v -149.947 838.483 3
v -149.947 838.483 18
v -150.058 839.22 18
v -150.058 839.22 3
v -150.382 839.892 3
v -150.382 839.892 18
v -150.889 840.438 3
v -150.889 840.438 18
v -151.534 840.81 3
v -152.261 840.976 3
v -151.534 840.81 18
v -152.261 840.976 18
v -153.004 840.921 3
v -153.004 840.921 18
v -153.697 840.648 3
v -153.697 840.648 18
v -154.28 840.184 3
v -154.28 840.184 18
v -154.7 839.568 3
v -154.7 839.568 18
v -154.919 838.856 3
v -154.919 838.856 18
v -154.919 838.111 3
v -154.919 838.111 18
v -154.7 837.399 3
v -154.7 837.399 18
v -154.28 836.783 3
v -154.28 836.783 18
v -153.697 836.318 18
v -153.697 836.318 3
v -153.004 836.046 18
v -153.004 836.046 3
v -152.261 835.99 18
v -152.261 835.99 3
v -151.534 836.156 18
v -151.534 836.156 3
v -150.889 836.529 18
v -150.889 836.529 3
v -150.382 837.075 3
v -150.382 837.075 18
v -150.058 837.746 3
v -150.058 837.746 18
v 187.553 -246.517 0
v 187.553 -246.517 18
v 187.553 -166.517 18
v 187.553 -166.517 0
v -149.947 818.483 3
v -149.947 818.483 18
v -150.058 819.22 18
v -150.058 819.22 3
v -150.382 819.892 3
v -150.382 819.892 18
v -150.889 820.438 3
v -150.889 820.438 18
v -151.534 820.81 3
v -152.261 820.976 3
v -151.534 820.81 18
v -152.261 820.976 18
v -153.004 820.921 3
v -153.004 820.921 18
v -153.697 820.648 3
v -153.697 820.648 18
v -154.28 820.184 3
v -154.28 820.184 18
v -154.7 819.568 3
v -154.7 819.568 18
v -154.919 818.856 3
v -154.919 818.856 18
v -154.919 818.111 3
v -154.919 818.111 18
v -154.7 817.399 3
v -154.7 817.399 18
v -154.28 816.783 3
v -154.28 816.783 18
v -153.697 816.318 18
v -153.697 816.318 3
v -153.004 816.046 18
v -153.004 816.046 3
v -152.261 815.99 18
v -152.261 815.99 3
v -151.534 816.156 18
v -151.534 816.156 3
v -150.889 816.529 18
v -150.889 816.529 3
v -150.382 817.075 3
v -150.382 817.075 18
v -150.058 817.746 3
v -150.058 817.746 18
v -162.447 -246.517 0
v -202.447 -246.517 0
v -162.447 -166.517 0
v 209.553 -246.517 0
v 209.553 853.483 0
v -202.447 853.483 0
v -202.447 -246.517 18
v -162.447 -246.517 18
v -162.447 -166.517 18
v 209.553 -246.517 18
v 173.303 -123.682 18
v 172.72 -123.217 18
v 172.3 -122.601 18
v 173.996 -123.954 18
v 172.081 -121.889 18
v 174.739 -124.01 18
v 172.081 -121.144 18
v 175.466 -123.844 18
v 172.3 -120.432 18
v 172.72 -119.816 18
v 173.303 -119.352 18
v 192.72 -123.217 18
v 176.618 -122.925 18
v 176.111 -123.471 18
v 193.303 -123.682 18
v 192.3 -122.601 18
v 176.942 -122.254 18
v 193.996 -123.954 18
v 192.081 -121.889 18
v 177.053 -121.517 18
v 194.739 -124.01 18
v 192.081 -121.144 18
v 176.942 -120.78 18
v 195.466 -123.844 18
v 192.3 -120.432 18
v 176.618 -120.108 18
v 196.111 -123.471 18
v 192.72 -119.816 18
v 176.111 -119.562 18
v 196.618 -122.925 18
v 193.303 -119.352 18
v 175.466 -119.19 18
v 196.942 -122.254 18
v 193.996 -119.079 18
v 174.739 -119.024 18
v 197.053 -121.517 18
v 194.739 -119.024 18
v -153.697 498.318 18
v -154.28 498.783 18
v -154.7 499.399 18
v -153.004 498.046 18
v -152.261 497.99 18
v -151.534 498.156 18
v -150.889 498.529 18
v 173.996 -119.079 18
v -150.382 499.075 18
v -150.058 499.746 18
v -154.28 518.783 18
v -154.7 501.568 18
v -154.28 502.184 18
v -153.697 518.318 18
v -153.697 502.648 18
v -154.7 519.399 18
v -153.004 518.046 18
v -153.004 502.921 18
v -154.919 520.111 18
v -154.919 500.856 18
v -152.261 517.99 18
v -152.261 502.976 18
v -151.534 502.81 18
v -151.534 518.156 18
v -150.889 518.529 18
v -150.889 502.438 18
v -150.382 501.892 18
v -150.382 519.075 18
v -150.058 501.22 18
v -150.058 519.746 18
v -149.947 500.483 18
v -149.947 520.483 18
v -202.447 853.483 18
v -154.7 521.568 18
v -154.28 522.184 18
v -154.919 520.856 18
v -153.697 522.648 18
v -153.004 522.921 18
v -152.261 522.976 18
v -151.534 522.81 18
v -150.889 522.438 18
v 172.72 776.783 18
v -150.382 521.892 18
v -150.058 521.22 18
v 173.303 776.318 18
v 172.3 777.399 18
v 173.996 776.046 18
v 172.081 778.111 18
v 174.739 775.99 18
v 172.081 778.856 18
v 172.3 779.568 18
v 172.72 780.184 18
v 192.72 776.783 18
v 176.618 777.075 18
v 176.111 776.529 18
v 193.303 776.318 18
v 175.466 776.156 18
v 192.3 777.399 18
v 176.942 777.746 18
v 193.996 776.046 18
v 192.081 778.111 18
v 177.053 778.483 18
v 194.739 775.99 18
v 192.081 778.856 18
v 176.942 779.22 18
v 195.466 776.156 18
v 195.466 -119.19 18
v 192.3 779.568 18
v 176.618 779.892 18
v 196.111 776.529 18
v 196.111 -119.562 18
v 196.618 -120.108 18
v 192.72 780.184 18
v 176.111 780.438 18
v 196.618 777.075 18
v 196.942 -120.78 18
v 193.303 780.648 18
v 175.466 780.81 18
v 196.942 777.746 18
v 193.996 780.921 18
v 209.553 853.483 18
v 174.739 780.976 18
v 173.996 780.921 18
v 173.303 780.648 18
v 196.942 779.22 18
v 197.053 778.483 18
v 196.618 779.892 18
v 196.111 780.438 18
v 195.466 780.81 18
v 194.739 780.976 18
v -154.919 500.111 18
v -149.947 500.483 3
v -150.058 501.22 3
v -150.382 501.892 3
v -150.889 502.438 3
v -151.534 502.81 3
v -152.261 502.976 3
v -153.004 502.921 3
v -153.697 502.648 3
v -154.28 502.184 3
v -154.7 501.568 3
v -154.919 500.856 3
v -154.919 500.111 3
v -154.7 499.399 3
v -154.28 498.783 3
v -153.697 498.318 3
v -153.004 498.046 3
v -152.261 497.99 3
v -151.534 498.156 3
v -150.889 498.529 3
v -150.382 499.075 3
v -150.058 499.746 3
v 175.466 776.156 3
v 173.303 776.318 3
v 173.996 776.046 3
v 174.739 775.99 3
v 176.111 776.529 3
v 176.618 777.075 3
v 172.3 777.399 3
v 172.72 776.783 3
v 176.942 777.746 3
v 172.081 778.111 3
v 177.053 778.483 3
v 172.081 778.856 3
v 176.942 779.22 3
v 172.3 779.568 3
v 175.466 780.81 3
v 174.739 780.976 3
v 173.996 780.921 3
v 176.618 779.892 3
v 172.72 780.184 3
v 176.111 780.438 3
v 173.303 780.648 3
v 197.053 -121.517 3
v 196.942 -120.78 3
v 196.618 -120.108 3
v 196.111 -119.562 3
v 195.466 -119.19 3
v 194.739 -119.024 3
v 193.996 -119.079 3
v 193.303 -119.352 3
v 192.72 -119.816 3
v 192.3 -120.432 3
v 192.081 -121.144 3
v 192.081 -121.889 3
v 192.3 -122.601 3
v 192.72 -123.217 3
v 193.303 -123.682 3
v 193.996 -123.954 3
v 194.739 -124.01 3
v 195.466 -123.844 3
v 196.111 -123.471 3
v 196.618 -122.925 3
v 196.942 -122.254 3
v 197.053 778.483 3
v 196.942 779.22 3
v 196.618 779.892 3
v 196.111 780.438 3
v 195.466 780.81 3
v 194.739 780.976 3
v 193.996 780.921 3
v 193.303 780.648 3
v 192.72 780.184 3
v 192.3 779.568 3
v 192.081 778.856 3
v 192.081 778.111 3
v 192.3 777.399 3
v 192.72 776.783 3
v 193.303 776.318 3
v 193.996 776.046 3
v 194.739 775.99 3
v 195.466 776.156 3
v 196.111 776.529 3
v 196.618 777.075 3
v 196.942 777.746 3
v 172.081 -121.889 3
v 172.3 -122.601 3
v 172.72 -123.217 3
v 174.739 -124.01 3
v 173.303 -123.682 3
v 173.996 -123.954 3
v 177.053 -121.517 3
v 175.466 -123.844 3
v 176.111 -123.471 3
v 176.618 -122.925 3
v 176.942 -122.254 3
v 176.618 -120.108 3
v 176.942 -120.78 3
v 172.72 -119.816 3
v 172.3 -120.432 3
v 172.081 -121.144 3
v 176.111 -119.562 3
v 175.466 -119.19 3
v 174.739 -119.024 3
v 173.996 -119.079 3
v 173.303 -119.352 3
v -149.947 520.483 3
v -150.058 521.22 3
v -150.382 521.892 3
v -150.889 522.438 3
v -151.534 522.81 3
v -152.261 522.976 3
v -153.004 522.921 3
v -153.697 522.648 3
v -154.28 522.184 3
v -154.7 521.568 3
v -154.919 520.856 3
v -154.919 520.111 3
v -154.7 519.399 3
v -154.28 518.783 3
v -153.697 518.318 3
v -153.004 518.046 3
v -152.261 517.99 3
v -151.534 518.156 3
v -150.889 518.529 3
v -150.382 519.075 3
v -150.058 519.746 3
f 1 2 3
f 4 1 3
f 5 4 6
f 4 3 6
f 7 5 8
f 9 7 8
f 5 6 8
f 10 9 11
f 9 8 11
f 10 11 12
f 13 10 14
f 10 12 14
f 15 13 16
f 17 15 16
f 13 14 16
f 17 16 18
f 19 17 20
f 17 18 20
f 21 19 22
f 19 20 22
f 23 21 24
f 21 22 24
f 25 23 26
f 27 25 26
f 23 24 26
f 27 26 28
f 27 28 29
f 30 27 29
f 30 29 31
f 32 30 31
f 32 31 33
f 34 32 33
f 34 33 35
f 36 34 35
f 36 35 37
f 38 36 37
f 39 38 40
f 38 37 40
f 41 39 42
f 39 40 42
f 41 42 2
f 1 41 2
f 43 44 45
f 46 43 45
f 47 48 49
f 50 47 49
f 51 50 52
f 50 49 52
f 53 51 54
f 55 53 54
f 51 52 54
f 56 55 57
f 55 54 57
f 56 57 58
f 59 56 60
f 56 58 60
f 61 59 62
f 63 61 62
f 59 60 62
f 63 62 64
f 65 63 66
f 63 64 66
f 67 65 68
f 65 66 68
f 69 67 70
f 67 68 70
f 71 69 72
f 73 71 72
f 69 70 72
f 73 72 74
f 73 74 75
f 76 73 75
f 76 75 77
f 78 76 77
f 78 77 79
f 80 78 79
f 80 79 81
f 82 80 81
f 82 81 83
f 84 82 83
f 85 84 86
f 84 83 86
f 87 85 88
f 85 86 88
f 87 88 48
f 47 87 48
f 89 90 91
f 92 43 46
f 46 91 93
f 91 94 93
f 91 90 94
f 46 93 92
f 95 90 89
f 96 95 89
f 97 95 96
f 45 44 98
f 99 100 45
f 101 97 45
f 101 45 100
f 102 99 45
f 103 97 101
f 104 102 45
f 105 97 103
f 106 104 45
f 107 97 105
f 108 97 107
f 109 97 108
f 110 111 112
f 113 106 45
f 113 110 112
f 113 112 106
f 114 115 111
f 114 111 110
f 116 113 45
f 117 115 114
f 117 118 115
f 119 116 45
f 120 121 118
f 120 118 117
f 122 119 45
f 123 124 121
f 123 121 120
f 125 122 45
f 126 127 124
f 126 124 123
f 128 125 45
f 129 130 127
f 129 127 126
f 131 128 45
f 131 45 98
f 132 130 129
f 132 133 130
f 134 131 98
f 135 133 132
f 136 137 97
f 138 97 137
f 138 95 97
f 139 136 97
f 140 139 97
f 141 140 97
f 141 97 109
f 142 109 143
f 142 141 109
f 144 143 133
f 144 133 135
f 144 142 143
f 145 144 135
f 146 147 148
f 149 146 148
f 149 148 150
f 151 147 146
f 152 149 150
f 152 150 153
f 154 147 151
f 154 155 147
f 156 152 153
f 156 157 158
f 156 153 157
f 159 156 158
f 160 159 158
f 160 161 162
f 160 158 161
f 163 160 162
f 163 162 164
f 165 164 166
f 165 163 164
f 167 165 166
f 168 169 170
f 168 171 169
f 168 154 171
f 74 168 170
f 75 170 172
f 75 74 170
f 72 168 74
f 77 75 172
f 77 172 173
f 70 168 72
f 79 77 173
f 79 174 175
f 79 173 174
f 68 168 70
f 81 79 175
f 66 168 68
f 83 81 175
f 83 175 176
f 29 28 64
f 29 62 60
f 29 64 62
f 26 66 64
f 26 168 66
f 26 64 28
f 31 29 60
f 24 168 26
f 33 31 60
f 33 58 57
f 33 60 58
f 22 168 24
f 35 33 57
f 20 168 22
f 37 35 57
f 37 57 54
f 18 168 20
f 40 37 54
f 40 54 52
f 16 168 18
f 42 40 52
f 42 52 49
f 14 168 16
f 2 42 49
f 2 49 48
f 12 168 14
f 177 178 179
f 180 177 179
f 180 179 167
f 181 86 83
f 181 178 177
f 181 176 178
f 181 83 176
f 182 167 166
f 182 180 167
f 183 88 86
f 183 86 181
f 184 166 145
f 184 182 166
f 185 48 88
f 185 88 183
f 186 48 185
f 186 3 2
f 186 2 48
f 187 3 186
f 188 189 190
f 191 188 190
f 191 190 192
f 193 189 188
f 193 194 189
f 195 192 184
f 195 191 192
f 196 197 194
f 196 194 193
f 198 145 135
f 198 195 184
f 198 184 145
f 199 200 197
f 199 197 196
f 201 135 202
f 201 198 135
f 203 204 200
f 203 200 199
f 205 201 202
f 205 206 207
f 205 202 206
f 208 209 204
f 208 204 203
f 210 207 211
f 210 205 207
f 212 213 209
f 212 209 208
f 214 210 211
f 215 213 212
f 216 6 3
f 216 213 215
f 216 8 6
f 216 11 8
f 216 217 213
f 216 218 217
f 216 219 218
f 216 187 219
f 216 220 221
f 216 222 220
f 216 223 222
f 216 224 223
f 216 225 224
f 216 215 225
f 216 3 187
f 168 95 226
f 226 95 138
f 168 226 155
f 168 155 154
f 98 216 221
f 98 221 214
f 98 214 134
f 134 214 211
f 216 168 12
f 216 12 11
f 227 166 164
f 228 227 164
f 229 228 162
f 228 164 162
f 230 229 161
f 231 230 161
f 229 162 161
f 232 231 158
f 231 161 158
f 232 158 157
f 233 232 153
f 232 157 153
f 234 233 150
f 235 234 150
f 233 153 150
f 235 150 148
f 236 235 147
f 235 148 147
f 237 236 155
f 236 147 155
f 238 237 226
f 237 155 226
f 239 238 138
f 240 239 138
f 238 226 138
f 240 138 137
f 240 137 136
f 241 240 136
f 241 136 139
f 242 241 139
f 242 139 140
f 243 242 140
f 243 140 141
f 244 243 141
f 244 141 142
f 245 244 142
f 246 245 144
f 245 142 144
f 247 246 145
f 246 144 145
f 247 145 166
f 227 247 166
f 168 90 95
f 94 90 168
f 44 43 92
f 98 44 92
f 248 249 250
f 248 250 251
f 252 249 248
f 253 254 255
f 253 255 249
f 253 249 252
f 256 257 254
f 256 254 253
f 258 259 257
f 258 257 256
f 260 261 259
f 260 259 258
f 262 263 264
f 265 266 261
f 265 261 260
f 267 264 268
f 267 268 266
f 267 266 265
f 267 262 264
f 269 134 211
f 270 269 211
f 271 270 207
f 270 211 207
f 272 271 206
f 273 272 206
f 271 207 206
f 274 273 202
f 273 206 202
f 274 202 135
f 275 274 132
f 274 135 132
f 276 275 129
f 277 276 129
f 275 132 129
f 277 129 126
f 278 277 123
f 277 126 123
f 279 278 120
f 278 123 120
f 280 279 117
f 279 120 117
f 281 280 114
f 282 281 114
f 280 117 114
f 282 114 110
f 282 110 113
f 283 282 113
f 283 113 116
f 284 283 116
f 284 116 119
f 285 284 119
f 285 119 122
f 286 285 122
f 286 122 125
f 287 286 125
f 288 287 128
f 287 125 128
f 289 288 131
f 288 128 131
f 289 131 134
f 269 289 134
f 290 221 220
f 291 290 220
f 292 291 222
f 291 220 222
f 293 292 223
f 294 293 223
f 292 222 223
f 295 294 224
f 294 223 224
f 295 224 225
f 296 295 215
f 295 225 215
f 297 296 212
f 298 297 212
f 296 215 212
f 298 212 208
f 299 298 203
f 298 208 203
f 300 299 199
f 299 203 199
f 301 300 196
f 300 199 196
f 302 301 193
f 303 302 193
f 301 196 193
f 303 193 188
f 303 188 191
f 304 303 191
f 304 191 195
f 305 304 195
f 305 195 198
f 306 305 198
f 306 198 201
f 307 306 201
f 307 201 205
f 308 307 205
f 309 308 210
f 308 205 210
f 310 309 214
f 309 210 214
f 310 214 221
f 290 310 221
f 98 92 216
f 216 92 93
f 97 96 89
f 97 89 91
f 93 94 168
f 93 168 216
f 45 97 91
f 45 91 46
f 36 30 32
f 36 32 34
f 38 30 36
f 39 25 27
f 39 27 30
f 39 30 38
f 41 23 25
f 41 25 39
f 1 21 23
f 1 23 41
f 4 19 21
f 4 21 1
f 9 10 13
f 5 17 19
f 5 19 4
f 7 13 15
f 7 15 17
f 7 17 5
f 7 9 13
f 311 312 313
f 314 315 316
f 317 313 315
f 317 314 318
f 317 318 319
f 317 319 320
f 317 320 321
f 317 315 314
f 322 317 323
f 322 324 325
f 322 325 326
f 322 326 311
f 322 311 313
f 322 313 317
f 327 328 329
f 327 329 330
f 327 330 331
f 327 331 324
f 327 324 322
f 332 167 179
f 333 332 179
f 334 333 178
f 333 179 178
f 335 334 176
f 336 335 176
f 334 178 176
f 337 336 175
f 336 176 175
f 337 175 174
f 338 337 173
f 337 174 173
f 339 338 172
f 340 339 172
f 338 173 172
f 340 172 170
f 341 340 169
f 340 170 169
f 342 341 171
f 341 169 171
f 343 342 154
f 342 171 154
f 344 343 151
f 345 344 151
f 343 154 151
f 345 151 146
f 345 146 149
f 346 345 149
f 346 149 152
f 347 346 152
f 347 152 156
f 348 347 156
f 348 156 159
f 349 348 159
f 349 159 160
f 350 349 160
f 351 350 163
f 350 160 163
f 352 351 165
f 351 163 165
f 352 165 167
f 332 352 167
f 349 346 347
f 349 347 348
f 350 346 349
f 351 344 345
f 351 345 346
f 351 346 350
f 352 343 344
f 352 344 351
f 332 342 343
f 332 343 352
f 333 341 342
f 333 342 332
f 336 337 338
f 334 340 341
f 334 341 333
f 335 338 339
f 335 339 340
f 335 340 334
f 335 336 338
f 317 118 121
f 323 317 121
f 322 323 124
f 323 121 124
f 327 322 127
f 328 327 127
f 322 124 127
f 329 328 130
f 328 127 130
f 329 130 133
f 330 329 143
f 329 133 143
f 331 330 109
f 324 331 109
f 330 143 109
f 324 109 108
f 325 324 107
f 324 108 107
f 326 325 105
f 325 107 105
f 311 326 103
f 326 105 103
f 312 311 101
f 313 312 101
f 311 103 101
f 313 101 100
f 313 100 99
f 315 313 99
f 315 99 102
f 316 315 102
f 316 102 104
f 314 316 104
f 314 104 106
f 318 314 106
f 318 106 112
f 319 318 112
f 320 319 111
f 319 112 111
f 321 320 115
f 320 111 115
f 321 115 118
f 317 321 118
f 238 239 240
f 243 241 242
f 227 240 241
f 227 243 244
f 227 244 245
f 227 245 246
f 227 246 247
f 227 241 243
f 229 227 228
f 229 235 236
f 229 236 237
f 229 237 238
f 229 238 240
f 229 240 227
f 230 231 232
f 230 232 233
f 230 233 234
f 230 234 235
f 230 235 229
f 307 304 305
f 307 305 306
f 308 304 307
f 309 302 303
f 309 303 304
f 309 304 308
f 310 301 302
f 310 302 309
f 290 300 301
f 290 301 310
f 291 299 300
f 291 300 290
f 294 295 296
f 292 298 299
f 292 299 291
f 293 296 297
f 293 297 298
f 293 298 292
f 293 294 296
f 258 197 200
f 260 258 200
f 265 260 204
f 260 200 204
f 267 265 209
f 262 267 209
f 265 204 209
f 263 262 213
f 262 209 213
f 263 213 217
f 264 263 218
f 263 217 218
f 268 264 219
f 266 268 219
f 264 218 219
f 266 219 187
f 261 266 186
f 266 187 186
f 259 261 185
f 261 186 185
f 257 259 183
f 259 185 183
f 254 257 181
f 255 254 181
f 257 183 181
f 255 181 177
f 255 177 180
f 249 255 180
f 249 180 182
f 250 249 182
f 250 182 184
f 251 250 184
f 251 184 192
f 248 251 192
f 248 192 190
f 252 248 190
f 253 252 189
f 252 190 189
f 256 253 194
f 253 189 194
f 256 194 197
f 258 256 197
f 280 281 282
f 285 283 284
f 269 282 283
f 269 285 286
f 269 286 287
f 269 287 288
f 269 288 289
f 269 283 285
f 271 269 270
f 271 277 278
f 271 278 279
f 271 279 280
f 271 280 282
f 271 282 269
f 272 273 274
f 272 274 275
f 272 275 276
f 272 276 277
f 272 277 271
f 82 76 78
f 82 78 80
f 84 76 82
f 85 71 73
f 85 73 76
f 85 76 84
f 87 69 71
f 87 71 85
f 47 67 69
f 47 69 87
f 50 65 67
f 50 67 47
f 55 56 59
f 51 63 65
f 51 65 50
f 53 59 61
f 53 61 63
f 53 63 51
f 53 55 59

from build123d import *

# Parameters (mm, degrees)
F0_W     = 412
F0_H     = 1100
F1_DEPTH = 18
F2_W     = 350
F2_H     = 80
F3_DEPTH = 25
F4_R     = 2.5
F5_DEPTH = 15


with BuildPart() as f1:
    # F0 (on Top) → F1 (new body)
    with BuildSketch(Plane.XY):
        with Locations((3.552631, 303.48327)):
            Rectangle(F0_W, F0_H)
    extrude(amount=F1_DEPTH)

    # F2 (on face) → F3 (cut)
    with BuildSketch(Plane.XY.offset(18)):
        with Locations((12.552631, -206.51673)):
            Rectangle(F2_W, F2_H)
    extrude(amount=-F3_DEPTH, mode=Mode.SUBTRACT)

    # F4 (on face) → F5 (cut)
    with BuildSketch(Plane.XY.offset(18)):
        with Locations((194.552631, 778.48327)):
            Circle(F4_R)
        with Locations((174.552631, 778.48327)):
            Circle(F4_R)
        with Locations((-152.447369, 818.48327)):
            Circle(F4_R)
        with Locations((-152.447369, 838.48327)):
            Circle(F4_R)
        with Locations((194.552631, -121.51673)):
            Circle(F4_R)
        with Locations((174.552631, -121.51673)):
            Circle(F4_R)
        with Locations((-152.447369, 520.48327)):
            Circle(F4_R)
        with Locations((-152.447369, 500.48327)):
            Circle(F4_R)
    extrude(amount=-F5_DEPTH, mode=Mode.SUBTRACT)


solid = f1.part
